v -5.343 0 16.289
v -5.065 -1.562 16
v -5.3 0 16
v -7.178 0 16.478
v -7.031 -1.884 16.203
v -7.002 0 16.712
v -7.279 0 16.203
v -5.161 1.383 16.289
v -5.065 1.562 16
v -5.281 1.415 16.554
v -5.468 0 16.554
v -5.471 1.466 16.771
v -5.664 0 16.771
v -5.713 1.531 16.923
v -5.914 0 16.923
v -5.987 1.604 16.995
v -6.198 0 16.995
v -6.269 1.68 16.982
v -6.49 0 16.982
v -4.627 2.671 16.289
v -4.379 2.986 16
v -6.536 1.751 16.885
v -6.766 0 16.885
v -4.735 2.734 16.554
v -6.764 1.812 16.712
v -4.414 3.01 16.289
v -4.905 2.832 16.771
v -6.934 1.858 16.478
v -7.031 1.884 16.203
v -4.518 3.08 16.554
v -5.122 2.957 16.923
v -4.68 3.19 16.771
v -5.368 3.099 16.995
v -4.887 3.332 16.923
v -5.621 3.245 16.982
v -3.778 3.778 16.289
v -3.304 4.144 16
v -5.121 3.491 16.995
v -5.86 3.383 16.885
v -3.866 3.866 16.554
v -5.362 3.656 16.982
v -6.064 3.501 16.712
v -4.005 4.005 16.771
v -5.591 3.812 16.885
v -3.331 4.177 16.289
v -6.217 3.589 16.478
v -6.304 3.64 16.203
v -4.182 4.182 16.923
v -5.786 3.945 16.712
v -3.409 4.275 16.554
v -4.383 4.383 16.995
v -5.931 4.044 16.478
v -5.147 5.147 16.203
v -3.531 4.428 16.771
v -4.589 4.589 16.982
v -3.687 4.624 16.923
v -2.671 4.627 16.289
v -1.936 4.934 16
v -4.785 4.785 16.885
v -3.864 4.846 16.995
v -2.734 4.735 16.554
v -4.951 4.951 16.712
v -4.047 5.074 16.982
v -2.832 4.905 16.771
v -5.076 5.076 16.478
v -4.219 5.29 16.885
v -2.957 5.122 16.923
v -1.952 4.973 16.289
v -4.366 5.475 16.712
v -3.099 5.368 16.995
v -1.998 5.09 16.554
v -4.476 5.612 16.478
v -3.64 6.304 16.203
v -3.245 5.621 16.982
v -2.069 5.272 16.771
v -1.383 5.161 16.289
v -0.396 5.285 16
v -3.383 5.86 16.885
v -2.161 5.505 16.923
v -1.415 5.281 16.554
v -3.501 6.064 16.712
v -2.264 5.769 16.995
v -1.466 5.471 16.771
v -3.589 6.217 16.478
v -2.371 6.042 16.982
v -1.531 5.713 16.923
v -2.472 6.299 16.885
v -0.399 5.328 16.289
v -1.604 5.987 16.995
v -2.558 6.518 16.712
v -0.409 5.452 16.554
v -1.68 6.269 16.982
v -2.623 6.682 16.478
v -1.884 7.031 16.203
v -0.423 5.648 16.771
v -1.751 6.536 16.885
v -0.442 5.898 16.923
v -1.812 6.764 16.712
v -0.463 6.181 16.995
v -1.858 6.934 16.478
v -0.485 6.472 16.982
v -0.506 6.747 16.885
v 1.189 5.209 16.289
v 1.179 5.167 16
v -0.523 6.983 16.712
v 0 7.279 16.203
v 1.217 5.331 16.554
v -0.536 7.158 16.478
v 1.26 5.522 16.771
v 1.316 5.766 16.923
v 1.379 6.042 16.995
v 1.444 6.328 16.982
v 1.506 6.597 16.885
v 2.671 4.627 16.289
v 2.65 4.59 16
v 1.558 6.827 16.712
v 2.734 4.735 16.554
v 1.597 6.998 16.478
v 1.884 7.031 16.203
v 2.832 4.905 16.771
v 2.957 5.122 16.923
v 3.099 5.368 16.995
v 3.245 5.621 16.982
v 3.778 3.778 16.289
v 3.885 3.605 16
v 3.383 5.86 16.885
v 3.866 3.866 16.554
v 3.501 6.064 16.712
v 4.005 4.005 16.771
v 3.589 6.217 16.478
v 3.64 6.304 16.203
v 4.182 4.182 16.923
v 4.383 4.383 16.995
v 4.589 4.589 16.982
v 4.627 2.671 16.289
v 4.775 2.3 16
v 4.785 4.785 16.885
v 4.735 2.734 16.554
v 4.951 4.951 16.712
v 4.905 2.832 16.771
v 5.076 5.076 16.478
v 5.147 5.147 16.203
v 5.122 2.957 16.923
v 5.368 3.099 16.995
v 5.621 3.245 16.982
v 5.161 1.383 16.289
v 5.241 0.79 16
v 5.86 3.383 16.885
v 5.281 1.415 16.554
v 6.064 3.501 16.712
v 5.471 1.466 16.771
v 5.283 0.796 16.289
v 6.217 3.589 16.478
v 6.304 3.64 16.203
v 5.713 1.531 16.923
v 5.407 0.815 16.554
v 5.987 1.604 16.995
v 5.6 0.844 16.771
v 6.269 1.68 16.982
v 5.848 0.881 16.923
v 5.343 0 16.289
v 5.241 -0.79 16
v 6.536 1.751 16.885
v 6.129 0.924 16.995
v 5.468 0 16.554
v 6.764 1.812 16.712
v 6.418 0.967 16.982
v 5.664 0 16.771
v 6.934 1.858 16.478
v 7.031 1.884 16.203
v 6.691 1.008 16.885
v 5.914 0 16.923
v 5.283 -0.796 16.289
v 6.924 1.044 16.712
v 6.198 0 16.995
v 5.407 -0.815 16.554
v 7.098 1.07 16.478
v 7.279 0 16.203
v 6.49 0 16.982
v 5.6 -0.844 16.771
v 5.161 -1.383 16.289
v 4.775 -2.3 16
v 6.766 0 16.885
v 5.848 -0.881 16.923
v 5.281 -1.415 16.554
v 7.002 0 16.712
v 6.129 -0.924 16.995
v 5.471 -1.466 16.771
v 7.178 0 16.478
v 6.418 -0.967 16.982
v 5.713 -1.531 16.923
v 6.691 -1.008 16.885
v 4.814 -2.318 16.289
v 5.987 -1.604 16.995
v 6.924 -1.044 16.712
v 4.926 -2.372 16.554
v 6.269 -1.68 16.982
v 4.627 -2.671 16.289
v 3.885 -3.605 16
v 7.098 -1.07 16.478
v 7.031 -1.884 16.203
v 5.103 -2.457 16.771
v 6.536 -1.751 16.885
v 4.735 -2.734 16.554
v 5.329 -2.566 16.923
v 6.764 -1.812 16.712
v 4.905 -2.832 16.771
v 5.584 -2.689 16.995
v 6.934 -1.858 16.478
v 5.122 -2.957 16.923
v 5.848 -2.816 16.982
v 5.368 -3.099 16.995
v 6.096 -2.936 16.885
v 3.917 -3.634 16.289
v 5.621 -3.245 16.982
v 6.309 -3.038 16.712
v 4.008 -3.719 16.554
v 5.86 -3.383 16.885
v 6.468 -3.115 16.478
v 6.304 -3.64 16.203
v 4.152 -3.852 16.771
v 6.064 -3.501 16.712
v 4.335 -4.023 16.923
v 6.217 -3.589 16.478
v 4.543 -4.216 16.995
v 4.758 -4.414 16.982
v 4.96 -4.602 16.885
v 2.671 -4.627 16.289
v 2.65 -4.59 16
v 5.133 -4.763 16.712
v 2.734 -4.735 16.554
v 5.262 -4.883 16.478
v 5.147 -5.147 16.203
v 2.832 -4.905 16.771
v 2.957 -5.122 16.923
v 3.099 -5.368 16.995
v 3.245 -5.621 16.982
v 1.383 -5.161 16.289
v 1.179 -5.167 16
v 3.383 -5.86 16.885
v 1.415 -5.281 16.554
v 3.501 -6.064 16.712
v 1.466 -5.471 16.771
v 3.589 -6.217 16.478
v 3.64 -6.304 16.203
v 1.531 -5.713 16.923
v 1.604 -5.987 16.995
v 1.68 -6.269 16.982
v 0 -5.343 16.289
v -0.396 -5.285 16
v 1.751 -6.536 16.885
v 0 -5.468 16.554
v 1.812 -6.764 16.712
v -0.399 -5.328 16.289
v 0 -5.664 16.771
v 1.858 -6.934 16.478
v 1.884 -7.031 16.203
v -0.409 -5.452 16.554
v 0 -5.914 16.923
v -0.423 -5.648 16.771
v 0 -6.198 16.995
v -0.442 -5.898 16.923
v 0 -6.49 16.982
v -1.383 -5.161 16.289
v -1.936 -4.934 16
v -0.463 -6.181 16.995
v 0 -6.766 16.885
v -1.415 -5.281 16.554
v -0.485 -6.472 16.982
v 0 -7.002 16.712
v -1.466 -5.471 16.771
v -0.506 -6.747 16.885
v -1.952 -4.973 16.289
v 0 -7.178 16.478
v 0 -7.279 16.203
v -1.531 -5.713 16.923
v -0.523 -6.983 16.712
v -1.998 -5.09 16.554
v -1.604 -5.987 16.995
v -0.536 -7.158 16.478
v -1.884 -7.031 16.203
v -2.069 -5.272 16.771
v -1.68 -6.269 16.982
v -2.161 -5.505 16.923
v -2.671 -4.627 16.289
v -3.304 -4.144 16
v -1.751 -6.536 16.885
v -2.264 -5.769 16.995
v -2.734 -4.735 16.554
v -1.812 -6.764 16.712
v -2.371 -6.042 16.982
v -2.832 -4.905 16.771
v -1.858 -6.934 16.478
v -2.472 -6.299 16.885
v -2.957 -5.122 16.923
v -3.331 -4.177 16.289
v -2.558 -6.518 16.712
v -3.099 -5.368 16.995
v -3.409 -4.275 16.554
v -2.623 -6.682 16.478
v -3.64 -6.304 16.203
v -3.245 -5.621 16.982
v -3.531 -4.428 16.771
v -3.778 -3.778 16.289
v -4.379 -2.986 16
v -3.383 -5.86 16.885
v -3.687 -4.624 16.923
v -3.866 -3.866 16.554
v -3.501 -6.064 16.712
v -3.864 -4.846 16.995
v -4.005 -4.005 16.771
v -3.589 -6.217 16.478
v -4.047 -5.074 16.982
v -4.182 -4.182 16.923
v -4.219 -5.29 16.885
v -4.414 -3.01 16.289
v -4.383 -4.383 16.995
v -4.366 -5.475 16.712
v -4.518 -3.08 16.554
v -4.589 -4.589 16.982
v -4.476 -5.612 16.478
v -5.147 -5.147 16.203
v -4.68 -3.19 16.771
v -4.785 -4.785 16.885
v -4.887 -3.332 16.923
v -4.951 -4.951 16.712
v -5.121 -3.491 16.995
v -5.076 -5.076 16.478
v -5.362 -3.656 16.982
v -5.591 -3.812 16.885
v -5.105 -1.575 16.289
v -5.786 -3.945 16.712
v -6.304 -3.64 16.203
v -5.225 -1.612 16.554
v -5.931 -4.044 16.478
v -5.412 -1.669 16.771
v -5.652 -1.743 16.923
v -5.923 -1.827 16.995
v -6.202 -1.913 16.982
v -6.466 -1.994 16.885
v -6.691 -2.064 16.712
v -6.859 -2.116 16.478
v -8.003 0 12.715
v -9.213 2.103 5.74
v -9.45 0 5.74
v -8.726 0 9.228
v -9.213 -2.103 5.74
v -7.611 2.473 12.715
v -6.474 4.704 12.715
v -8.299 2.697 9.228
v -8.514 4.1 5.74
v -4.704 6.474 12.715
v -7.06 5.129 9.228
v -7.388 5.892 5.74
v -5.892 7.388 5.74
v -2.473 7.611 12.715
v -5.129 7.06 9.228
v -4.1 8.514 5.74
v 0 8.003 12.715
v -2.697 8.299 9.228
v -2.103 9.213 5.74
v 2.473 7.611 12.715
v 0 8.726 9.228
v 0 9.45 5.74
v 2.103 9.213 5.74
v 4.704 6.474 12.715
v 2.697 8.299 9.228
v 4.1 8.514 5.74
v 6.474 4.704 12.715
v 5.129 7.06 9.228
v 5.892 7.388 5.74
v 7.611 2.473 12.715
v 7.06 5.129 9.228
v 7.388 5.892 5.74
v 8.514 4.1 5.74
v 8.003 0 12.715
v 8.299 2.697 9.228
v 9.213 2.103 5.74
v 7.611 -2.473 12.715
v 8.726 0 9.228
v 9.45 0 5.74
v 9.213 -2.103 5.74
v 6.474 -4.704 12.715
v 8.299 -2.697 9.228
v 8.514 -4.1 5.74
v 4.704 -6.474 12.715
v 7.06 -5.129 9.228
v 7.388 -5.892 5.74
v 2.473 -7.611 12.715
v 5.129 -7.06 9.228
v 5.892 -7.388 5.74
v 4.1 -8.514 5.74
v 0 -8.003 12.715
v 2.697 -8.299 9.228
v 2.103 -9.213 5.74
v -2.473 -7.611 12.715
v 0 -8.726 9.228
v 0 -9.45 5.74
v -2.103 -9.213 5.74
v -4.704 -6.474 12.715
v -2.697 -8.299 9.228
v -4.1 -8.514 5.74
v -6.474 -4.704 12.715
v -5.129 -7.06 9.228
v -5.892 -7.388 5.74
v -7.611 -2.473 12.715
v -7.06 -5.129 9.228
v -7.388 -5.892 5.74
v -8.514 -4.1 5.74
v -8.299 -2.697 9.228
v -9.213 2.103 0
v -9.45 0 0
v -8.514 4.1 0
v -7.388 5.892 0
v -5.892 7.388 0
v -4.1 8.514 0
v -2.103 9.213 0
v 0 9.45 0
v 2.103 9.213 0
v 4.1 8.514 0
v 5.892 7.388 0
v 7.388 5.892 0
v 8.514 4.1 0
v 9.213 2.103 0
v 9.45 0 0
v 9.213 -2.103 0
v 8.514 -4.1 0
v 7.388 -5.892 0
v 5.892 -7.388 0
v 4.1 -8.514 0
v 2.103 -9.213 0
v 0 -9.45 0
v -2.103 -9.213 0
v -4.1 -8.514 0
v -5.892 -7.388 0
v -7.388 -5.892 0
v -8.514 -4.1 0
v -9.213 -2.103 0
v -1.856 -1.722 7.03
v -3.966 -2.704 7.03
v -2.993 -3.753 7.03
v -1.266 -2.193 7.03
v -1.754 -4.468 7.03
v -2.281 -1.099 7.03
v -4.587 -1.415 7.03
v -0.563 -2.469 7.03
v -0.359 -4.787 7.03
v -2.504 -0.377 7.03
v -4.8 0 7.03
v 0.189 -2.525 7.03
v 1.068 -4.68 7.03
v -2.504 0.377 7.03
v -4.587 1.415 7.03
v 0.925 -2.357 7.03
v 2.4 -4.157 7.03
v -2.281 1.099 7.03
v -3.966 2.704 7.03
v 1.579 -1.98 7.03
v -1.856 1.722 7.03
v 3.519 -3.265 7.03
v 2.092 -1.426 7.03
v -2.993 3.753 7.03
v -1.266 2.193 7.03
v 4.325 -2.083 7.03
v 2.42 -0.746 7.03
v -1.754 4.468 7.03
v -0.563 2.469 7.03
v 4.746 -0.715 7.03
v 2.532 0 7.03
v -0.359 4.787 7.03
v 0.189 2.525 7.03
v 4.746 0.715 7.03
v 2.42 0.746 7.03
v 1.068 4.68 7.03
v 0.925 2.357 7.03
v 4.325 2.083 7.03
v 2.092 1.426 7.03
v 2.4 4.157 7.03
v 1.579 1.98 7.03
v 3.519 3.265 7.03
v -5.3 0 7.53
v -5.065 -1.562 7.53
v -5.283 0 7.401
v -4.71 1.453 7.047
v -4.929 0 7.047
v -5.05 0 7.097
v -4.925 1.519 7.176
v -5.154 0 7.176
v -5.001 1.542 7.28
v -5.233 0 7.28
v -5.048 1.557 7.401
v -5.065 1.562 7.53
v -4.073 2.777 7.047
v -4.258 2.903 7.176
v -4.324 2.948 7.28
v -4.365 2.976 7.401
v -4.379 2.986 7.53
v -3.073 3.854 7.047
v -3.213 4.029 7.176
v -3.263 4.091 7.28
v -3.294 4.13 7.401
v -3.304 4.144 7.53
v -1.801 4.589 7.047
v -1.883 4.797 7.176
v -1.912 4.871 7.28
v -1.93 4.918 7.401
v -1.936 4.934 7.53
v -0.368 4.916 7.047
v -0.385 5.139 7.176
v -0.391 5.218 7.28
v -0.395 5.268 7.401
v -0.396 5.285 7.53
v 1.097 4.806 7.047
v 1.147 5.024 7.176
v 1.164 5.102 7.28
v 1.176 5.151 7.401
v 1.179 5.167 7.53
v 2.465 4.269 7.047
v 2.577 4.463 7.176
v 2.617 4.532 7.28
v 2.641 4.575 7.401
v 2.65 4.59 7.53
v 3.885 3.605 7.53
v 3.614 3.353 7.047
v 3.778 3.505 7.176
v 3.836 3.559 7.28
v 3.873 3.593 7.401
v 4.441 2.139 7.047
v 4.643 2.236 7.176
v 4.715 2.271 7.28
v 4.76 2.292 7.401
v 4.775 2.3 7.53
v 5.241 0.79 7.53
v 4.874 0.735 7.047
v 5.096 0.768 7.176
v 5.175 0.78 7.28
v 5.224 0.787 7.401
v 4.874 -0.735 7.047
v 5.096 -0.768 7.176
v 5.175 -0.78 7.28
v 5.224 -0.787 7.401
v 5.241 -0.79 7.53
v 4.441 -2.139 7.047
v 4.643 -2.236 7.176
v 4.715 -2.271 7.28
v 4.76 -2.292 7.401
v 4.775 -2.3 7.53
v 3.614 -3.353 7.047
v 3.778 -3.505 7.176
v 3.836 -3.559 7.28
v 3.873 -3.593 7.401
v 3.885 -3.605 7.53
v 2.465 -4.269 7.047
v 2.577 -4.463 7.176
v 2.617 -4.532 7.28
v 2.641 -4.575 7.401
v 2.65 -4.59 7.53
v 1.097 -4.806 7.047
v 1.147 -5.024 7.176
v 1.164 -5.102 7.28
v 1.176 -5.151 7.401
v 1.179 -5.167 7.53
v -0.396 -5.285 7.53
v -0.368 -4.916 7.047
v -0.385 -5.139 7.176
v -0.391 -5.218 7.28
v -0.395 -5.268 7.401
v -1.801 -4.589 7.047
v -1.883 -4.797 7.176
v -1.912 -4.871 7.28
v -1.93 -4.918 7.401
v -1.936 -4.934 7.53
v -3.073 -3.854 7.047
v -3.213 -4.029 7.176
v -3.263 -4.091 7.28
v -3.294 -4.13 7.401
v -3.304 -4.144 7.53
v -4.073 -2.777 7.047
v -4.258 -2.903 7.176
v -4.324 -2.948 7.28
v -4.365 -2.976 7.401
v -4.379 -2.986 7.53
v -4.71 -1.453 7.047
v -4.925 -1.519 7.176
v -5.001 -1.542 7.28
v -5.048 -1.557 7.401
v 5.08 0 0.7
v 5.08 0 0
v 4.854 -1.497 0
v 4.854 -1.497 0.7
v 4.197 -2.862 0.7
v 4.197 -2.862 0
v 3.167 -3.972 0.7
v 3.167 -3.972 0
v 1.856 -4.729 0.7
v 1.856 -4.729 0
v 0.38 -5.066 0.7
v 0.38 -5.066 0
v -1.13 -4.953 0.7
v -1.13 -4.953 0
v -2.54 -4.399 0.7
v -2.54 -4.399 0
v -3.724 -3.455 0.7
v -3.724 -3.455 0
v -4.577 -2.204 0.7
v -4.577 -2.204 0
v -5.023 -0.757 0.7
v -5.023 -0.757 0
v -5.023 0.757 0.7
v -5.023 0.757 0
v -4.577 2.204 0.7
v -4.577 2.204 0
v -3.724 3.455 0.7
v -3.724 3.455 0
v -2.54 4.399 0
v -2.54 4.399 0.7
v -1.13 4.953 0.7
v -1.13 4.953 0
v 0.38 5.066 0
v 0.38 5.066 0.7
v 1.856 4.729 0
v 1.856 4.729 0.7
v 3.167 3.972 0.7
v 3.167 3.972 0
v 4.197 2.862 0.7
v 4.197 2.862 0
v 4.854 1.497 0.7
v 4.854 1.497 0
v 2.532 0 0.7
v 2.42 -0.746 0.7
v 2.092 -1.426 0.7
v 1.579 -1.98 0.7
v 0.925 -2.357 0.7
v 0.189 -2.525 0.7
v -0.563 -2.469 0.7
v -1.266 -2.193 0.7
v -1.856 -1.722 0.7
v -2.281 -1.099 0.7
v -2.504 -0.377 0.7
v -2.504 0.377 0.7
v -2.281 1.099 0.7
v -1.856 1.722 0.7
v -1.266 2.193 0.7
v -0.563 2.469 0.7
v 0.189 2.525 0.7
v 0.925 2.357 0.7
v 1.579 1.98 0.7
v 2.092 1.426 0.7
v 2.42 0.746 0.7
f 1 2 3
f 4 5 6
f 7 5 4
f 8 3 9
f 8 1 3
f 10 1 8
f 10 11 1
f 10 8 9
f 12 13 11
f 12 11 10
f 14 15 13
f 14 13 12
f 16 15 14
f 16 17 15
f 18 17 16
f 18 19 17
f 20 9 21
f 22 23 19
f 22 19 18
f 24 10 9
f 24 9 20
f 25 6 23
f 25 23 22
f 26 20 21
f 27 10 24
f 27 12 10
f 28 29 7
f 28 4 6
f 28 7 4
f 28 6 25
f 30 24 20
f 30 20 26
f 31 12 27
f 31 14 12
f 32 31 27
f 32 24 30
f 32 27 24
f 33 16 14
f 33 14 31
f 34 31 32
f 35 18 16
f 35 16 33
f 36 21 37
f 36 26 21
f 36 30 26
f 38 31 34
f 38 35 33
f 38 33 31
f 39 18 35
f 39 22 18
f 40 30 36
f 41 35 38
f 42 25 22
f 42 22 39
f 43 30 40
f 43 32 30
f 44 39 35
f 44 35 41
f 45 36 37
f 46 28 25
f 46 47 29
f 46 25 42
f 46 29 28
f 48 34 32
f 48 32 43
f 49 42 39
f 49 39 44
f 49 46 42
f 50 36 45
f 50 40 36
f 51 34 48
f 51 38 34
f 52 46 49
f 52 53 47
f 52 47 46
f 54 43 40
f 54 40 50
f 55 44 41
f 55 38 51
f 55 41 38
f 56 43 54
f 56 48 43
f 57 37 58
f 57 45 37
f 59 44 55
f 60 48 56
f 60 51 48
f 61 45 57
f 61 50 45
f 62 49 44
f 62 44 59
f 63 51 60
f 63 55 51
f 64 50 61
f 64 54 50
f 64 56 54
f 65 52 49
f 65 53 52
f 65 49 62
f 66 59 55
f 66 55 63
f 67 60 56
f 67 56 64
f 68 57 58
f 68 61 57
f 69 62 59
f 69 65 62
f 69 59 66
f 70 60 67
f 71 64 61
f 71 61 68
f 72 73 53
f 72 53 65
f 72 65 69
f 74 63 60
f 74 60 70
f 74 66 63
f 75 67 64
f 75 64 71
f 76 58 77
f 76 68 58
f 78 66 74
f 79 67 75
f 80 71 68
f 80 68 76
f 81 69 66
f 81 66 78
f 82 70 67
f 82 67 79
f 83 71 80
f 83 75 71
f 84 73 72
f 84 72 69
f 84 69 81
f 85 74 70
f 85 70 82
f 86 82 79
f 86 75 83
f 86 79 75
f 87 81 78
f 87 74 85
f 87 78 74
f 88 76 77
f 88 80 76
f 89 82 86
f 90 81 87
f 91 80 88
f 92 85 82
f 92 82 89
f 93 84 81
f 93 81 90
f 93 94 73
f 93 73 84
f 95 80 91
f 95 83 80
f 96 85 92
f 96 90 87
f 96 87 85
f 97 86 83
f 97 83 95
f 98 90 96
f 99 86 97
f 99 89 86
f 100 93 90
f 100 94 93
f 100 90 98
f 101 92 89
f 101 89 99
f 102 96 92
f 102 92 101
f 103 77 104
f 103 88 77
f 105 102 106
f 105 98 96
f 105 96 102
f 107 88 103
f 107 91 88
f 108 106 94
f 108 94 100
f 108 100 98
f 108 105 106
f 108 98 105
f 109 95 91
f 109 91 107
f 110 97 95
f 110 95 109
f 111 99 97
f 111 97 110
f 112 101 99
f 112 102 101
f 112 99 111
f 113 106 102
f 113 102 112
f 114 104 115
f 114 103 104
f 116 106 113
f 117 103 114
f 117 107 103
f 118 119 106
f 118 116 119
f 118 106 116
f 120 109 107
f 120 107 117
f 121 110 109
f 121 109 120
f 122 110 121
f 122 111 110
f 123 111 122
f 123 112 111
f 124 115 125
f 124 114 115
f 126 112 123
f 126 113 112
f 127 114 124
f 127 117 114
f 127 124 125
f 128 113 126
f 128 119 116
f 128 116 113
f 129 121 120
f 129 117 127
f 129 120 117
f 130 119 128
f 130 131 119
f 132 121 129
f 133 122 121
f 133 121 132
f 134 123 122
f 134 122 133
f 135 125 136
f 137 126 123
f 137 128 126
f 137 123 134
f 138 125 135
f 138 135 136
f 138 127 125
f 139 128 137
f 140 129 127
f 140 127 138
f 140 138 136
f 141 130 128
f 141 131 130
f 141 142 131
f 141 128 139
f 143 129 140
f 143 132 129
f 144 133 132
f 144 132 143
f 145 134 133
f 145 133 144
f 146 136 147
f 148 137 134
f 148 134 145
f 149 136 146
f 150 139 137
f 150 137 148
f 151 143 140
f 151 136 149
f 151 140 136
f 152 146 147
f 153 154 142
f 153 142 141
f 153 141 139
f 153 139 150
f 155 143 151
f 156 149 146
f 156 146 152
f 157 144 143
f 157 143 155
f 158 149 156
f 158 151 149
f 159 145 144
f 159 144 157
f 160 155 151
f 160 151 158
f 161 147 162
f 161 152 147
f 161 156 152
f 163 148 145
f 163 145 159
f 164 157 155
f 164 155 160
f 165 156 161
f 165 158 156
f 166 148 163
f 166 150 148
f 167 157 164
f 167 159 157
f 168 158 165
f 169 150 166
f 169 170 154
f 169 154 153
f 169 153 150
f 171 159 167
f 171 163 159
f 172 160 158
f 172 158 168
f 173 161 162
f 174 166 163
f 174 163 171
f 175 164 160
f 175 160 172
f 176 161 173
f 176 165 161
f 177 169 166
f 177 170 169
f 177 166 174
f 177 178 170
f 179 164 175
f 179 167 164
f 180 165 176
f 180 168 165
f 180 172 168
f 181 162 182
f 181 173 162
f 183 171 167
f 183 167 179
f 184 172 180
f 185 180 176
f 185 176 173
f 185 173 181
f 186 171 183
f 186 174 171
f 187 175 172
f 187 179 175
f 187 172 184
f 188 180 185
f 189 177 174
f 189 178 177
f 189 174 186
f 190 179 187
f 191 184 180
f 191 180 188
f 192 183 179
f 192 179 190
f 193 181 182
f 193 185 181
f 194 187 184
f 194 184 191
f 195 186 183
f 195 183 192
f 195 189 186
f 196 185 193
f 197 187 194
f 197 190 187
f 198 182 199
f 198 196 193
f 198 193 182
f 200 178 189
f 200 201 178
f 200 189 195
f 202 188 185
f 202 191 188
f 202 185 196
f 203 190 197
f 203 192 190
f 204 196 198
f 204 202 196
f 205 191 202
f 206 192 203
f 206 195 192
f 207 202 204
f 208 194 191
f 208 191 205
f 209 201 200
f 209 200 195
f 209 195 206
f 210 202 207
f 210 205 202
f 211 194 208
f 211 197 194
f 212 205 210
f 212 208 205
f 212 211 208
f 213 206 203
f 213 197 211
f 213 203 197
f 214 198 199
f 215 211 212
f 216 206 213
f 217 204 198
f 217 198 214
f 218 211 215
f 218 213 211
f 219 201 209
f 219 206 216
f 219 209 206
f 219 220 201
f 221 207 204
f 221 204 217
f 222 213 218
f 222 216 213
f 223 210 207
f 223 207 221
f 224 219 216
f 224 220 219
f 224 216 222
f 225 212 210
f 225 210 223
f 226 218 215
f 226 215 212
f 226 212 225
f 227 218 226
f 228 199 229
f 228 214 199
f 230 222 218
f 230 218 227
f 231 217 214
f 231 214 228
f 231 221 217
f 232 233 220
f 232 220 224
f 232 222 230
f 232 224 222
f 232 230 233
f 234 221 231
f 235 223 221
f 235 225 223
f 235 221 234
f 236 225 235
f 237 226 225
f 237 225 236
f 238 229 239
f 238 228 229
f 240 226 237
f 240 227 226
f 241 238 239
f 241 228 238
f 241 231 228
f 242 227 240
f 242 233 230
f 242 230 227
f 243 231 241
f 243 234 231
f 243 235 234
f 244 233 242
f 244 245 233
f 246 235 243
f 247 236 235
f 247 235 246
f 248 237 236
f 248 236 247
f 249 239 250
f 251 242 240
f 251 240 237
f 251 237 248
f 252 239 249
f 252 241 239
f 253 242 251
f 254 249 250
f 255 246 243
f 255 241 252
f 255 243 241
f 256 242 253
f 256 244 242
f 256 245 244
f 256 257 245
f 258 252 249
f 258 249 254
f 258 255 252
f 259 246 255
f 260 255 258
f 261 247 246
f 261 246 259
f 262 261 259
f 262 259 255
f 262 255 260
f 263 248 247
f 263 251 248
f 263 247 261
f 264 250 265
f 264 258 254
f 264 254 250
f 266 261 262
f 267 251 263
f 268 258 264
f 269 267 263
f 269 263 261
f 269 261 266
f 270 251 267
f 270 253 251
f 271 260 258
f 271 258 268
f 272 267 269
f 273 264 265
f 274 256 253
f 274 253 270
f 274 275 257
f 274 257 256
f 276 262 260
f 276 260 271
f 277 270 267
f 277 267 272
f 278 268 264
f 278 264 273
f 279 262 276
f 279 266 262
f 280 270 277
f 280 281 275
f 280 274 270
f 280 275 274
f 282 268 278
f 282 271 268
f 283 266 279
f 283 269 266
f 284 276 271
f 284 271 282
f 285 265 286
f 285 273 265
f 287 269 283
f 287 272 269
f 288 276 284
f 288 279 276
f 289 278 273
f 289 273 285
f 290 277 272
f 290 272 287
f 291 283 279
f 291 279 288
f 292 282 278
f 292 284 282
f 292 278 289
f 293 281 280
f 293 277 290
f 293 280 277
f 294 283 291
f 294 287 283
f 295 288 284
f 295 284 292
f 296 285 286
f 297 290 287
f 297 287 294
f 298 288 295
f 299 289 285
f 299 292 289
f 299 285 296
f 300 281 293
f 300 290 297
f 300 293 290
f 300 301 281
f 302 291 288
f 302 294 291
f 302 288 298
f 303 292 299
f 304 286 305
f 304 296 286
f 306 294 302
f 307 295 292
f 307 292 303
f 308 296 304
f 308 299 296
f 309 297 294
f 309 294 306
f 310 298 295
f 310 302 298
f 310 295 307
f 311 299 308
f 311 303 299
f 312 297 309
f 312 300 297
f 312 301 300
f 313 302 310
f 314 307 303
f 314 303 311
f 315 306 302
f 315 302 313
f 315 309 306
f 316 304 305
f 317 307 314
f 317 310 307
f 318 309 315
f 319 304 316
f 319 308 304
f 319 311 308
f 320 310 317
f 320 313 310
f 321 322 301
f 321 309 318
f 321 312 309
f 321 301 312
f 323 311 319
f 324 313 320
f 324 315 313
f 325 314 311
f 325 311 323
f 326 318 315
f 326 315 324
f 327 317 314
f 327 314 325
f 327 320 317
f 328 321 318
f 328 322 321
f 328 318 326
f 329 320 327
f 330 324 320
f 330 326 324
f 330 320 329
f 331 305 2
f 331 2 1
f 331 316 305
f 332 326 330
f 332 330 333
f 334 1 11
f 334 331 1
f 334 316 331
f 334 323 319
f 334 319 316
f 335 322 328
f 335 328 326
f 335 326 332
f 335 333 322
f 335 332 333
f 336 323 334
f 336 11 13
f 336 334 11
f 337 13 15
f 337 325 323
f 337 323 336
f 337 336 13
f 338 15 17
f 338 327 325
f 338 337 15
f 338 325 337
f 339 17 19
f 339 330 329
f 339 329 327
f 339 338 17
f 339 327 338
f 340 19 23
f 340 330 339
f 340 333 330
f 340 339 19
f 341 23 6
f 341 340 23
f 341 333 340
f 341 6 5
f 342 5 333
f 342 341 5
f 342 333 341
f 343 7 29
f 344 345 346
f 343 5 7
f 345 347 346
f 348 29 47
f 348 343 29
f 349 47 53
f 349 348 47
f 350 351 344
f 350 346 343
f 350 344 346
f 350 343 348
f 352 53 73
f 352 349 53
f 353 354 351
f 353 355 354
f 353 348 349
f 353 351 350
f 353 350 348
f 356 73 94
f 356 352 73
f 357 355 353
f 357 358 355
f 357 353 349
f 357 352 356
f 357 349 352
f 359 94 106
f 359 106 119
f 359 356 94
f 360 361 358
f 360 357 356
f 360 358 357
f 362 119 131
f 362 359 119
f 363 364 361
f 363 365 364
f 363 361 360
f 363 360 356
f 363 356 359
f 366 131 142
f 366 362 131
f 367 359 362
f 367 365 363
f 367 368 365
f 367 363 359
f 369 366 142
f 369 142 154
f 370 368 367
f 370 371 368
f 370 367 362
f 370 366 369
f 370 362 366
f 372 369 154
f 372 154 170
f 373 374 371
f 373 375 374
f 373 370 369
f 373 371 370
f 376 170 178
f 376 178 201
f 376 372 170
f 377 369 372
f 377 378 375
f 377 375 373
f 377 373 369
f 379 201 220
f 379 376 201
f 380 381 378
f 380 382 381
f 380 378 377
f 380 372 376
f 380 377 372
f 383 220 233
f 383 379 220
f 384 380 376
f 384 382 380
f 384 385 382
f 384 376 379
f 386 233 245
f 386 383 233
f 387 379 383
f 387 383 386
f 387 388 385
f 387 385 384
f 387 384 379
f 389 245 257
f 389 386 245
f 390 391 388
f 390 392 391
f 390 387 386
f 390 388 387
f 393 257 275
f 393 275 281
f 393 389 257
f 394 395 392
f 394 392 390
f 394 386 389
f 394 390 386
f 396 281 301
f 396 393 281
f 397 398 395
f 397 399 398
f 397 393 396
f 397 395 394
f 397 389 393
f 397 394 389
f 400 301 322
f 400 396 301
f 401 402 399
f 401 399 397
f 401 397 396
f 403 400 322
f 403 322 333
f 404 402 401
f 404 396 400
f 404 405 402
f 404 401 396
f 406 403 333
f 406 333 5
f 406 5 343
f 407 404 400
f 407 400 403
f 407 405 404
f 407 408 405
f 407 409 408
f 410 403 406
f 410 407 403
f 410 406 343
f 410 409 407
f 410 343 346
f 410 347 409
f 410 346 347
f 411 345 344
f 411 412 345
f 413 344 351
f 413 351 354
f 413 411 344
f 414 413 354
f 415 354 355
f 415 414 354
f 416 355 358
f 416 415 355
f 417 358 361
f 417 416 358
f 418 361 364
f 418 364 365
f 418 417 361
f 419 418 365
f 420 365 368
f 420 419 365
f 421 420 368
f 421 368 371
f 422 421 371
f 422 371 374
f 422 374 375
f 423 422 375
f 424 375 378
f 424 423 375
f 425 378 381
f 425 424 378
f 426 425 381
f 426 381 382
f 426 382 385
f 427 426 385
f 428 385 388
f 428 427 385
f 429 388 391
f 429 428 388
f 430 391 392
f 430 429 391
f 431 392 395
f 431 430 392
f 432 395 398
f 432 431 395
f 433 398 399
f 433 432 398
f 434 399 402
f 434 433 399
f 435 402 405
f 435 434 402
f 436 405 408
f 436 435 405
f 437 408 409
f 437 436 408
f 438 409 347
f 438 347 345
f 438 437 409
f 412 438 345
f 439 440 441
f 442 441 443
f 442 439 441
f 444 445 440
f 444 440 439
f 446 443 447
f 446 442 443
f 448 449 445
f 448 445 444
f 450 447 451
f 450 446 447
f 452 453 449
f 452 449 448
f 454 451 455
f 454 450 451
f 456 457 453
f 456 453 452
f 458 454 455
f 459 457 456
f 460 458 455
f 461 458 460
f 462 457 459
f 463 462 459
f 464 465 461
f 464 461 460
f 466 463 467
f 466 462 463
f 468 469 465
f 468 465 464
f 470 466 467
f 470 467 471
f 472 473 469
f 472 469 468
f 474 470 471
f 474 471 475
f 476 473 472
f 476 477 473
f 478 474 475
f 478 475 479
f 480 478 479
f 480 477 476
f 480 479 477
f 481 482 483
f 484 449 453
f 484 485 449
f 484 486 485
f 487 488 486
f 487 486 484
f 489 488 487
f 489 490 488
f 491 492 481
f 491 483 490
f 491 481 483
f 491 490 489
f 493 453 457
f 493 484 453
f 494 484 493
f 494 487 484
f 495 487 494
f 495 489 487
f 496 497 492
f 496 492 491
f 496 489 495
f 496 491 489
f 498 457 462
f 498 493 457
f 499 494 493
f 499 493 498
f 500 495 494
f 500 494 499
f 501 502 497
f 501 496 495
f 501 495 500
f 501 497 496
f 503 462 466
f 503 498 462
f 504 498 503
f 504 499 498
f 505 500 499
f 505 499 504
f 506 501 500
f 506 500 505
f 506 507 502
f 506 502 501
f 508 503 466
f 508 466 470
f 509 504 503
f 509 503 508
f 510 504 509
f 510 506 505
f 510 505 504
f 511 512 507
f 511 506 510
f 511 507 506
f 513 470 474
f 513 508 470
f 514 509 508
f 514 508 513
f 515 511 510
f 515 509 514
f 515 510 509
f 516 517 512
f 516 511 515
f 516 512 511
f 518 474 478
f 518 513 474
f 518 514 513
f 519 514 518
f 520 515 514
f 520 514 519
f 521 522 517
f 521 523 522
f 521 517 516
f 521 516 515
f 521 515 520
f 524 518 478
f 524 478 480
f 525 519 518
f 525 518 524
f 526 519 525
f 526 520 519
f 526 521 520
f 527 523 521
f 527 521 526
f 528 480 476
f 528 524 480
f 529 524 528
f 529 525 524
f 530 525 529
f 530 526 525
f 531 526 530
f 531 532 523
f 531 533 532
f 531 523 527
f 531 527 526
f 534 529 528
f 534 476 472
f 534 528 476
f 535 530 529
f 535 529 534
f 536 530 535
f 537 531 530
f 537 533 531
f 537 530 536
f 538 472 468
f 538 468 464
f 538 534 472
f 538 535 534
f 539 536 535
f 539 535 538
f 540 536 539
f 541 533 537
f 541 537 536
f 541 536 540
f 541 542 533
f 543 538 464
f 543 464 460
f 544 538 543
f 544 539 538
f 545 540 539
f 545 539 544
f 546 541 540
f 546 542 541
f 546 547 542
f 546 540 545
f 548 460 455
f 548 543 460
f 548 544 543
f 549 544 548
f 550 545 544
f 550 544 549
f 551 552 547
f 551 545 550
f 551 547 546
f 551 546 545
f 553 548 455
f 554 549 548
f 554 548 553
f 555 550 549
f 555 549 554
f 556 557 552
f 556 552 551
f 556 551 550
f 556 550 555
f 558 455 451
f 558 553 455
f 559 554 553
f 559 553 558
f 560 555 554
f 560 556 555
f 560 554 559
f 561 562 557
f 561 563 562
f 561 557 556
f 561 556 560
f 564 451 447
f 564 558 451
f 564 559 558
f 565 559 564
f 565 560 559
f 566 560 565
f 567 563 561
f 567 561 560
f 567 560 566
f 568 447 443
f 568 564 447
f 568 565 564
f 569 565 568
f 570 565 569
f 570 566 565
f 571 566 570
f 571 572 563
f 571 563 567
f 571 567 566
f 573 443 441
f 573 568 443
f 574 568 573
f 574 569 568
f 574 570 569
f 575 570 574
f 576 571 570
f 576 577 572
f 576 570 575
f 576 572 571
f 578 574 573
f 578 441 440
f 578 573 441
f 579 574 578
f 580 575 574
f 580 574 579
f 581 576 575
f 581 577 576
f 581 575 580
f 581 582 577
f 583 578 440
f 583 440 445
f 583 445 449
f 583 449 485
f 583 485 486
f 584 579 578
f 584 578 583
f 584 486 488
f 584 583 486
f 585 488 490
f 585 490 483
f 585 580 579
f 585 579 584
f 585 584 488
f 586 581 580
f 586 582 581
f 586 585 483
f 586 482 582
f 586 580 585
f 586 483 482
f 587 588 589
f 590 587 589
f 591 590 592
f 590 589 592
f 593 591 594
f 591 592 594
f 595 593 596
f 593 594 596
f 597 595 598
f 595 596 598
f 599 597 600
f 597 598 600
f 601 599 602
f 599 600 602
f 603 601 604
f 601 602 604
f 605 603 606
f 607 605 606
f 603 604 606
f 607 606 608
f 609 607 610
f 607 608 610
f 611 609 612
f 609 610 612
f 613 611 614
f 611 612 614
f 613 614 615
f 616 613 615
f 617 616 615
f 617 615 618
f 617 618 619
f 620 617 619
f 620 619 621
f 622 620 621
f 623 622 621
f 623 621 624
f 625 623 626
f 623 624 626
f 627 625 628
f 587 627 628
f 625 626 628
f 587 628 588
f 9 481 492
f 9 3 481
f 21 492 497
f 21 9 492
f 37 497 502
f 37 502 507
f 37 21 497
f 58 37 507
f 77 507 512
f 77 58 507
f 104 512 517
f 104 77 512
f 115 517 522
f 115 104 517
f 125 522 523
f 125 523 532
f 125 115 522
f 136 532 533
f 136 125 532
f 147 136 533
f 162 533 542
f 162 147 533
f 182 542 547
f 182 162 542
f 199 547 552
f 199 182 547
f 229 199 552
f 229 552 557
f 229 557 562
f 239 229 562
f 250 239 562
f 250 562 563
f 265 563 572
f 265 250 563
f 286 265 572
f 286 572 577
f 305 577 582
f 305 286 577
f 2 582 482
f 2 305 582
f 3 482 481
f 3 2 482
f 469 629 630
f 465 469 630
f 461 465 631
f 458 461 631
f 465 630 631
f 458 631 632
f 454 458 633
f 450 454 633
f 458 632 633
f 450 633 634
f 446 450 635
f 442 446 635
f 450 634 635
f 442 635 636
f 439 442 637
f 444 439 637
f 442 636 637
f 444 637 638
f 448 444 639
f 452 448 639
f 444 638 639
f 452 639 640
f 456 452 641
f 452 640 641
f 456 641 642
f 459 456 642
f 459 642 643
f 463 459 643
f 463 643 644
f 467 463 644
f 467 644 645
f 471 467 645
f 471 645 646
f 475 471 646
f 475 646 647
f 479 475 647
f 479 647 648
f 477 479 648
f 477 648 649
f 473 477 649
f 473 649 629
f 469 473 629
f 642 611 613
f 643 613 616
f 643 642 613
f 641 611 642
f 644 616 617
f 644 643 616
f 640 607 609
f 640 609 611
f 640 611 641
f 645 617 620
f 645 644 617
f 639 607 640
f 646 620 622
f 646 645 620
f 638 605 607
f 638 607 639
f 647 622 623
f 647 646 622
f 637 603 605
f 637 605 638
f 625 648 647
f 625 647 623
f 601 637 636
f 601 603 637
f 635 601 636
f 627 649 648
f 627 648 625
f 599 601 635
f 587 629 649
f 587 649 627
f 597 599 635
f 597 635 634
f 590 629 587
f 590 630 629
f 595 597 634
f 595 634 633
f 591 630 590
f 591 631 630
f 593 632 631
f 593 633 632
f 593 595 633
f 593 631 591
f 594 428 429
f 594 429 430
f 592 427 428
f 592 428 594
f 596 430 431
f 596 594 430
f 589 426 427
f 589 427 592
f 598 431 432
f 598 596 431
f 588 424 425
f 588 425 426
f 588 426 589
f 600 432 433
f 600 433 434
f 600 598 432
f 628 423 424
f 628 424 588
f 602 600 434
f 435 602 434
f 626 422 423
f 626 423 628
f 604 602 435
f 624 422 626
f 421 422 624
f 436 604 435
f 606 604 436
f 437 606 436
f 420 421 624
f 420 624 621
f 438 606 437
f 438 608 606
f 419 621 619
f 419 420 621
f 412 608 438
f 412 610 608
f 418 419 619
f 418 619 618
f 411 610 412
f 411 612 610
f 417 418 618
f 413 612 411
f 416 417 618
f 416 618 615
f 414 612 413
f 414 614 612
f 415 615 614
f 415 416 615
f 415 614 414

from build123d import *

# Parameters (mm, degrees)
F2_R     = 5.08005
F3_DEPTH = 0.7
F4_R     = 2.532044
F5_DEPTH = 25


with BuildPart() as f1:
    # F0 (on Front) → F1 (revolve)
    with BuildSketch(Plane.XZ):
        with BuildLine():
            Line((-9.45, 0), (0, 0))
            Line((0, 0), (0, 7.03))
            Line((0, 7.03), (-4.8, 7.03))
            ThreePointArc((-4.8, 7.03), (-5.153553, 7.176447), (-5.3, 7.53))
            Line((-5.3, 7.53), (-5.3, 16))
            ThreePointArc((-5.3, 16), (-6.197891, 16.994773), (-7.279148, 16.20315))
            Line((-7.279148, 16.20315), (-9.45, 5.74))
            Line((-9.45, 5.74), (-9.45, 0))
        make_face()
    revolve(axis=Axis((0, 0, 3.515), (0, 0, -1)))

    # F2 (on face) → F3 (cut)
    with BuildSketch(Plane(origin=(0, 0, 0), x_dir=(1, 0, 0), z_dir=(0, 0, -1))):
        Circle(F2_R)
    extrude(amount=-F3_DEPTH, mode=Mode.SUBTRACT)

    # F4 (on face) → F5 (cut)
    with BuildSketch(Plane(origin=(0, 0, 0.7), x_dir=(1, 0, 0), z_dir=(0, 0, -1))):
        Circle(F4_R)
    extrude(amount=-F5_DEPTH, mode=Mode.SUBTRACT)


solid = f1.part
